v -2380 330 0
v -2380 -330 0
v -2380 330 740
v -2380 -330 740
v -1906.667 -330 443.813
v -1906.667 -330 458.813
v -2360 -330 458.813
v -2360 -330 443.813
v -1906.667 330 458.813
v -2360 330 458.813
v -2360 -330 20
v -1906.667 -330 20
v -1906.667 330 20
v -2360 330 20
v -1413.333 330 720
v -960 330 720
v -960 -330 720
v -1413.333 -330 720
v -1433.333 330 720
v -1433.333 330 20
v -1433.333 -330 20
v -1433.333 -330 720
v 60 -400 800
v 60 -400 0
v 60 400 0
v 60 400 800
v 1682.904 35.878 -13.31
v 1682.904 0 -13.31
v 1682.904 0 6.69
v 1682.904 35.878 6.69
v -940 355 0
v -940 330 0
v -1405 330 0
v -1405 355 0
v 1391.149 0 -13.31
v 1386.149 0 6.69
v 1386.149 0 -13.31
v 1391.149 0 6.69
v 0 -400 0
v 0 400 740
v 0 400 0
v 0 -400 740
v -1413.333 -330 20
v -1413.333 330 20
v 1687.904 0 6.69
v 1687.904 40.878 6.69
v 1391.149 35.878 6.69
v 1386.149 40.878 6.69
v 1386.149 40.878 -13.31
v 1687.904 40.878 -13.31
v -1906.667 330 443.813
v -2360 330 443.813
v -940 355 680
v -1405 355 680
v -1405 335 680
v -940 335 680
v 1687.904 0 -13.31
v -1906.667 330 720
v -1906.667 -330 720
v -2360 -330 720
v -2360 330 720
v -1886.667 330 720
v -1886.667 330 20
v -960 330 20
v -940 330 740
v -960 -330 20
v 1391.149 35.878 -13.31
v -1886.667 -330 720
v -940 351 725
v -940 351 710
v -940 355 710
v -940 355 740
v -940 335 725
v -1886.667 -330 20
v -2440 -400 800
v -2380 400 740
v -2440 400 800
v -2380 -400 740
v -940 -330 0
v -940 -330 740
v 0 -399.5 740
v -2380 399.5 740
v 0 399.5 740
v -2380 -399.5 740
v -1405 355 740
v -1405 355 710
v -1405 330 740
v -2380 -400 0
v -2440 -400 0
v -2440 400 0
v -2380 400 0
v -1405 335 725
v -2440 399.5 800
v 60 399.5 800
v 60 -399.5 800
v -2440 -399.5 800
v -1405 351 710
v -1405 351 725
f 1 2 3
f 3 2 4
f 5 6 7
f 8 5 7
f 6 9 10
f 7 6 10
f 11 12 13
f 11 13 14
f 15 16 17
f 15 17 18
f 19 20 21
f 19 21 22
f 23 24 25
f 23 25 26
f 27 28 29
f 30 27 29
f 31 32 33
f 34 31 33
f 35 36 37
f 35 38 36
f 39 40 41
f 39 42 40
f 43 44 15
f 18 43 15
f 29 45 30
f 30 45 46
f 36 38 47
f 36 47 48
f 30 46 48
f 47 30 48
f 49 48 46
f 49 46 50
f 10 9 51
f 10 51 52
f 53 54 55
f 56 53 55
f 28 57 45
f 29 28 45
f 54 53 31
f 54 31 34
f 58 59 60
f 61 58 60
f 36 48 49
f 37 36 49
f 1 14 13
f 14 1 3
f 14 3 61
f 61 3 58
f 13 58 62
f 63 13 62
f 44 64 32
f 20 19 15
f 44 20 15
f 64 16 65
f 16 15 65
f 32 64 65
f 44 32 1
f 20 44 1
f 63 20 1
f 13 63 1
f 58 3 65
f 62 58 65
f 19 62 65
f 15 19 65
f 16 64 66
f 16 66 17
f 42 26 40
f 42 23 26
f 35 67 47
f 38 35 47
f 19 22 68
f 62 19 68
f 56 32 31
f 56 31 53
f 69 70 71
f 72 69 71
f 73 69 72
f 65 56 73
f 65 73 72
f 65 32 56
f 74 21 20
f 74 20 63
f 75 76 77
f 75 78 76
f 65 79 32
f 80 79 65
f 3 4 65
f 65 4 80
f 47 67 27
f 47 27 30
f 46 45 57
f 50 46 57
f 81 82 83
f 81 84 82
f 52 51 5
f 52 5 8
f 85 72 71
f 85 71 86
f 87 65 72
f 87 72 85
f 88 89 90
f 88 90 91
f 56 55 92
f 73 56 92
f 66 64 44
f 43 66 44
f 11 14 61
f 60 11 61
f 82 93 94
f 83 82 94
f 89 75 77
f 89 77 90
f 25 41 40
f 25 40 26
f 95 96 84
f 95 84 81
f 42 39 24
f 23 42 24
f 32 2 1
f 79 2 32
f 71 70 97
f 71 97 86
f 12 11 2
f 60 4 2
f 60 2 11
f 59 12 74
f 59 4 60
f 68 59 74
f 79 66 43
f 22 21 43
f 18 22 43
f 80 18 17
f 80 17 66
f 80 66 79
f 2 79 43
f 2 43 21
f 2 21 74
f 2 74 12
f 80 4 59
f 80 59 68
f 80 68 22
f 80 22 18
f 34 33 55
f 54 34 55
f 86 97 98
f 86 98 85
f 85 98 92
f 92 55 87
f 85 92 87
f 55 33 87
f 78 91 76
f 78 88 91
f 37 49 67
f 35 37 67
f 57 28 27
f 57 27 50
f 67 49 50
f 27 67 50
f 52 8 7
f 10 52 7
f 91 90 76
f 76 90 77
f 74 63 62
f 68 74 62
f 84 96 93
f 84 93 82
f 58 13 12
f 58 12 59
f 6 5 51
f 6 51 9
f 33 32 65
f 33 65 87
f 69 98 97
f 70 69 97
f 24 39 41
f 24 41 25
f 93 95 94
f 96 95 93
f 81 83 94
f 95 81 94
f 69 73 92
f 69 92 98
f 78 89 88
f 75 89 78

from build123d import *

# Parameters (mm, degrees)
F1_DEPTH  = 400
F3_DEPTH  = 399.5
F5_DEPTH  = 400
F6_W      = 1440
F6_H      = 740
F7_DEPTH  = 330
F8_W      = 453.3333333333
F8_H      = 700
F9_DEPTH  = 730.001
F10_W     = 453.3333333333
F10_H     = 15
F11_DEPTH = 660
F12_W     = 465
F12_H     = 740
F13_DEPTH = 25
F15_W     = 5
F15_H     = 20
F18_DEPTH = 465


with BuildPart() as f1:
    # F0 (on Front) → F1 (new body, symmetric)
    with BuildSketch(Plane.XZ):
        Polygon((0, 740), (0, 0), (60, 0), (60, 800), align=None)
    extrude(amount=F1_DEPTH, both=True)


with BuildPart() as f3:
    # F2 (on Front) → F3 (new body, symmetric)
    with BuildSketch(Plane.XZ):
        Polygon((0, 740), (60, 800), (-2440, 800), (-2380, 740), align=None)
    extrude(amount=F3_DEPTH, both=True)


with BuildPart() as f5:
    # F4 (on Front) → F5 (new body, symmetric)
    with BuildSketch(Plane.XZ):
        Polygon((-2380, 740), (-2440, 800), (-2440, 0), (-2380, 0), align=None)
    extrude(amount=F5_DEPTH, both=True)


with BuildPart() as f7:
    # F6 (on Front) → F7 (new body, symmetric)
    with BuildSketch(Plane.XZ):
        with Locations((-1660, 370)):
            Rectangle(F6_W, F6_H)
    extrude(amount=F7_DEPTH, both=True)

    # F8 (on face) → F9 (cut, through all)
    with BuildSketch(Plane(origin=(0, 330, 0), x_dir=(-1, 0, 0), z_dir=(0, 1, 0))):
        with Locations((1186.6666666667, 370)):
            Rectangle(F8_W, F8_H)
        with Locations((1660, 370)):
            Rectangle(F8_W, F8_H)
        with Locations((2133.3333333333, 370)):
            Rectangle(F8_W, F8_H)
    extrude(amount=-F9_DEPTH, mode=Mode.SUBTRACT)


with BuildPart() as f11:
    # F10 (on face) → F11 (new body, through all)
    with BuildSketch(Plane(origin=(0, 330, 0), x_dir=(-1, 0, 0), z_dir=(0, 1, 0))):
        with Locations((2133.3333333333, 451.3132941723)):
            Rectangle(F10_W, F10_H)
    extrude(amount=-F11_DEPTH)


with BuildPart() as f13:
    # F12 (on face) → F13 (new body)
    with BuildSketch(Plane(origin=(0, 330, 0), x_dir=(-1, 0, 0), z_dir=(0, 1, 0))):
        with Locations((1172.5, 370)):
            Rectangle(F12_W, F12_H)
    extrude(amount=F13_DEPTH)

    # F17 (on face) → F18 (cut, through all)
    with BuildSketch(Plane(origin=(-1405, 0, 0), x_dir=(0, -1, 0), z_dir=(-1, 0, 0))):
        Polygon((-351, 710), (-355, 710), (-355, 680), (-335, 680), (-335, 725), (-351, 725), align=None)
    extrude(amount=-F18_DEPTH, mode=Mode.SUBTRACT)


with BuildPart() as f16:
    # F16: sweep along a path in F14
    with BuildLine(Plane.XY) as f16_path:
        Line((1387.0265483856, 0), (1387.0265483856, 40))
        Line((1387.0265483856, 40), (1687.0265483856, 40))
        Line((1687.0265483856, 40), (1687.0265483856, 0))
    # F15 (on Front) → F16 (sweep)
    with BuildSketch(Plane.XZ):
        with Locations((1388.6488056183, -3.3098214678)):
            Rectangle(F15_W, F15_H)
    sweep(path=f16_path.line, transition=Transition.RIGHT)


solid = Compound([f1.part, f3.part, f5.part, f7.part, f11.part, f13.part, f16.part])
